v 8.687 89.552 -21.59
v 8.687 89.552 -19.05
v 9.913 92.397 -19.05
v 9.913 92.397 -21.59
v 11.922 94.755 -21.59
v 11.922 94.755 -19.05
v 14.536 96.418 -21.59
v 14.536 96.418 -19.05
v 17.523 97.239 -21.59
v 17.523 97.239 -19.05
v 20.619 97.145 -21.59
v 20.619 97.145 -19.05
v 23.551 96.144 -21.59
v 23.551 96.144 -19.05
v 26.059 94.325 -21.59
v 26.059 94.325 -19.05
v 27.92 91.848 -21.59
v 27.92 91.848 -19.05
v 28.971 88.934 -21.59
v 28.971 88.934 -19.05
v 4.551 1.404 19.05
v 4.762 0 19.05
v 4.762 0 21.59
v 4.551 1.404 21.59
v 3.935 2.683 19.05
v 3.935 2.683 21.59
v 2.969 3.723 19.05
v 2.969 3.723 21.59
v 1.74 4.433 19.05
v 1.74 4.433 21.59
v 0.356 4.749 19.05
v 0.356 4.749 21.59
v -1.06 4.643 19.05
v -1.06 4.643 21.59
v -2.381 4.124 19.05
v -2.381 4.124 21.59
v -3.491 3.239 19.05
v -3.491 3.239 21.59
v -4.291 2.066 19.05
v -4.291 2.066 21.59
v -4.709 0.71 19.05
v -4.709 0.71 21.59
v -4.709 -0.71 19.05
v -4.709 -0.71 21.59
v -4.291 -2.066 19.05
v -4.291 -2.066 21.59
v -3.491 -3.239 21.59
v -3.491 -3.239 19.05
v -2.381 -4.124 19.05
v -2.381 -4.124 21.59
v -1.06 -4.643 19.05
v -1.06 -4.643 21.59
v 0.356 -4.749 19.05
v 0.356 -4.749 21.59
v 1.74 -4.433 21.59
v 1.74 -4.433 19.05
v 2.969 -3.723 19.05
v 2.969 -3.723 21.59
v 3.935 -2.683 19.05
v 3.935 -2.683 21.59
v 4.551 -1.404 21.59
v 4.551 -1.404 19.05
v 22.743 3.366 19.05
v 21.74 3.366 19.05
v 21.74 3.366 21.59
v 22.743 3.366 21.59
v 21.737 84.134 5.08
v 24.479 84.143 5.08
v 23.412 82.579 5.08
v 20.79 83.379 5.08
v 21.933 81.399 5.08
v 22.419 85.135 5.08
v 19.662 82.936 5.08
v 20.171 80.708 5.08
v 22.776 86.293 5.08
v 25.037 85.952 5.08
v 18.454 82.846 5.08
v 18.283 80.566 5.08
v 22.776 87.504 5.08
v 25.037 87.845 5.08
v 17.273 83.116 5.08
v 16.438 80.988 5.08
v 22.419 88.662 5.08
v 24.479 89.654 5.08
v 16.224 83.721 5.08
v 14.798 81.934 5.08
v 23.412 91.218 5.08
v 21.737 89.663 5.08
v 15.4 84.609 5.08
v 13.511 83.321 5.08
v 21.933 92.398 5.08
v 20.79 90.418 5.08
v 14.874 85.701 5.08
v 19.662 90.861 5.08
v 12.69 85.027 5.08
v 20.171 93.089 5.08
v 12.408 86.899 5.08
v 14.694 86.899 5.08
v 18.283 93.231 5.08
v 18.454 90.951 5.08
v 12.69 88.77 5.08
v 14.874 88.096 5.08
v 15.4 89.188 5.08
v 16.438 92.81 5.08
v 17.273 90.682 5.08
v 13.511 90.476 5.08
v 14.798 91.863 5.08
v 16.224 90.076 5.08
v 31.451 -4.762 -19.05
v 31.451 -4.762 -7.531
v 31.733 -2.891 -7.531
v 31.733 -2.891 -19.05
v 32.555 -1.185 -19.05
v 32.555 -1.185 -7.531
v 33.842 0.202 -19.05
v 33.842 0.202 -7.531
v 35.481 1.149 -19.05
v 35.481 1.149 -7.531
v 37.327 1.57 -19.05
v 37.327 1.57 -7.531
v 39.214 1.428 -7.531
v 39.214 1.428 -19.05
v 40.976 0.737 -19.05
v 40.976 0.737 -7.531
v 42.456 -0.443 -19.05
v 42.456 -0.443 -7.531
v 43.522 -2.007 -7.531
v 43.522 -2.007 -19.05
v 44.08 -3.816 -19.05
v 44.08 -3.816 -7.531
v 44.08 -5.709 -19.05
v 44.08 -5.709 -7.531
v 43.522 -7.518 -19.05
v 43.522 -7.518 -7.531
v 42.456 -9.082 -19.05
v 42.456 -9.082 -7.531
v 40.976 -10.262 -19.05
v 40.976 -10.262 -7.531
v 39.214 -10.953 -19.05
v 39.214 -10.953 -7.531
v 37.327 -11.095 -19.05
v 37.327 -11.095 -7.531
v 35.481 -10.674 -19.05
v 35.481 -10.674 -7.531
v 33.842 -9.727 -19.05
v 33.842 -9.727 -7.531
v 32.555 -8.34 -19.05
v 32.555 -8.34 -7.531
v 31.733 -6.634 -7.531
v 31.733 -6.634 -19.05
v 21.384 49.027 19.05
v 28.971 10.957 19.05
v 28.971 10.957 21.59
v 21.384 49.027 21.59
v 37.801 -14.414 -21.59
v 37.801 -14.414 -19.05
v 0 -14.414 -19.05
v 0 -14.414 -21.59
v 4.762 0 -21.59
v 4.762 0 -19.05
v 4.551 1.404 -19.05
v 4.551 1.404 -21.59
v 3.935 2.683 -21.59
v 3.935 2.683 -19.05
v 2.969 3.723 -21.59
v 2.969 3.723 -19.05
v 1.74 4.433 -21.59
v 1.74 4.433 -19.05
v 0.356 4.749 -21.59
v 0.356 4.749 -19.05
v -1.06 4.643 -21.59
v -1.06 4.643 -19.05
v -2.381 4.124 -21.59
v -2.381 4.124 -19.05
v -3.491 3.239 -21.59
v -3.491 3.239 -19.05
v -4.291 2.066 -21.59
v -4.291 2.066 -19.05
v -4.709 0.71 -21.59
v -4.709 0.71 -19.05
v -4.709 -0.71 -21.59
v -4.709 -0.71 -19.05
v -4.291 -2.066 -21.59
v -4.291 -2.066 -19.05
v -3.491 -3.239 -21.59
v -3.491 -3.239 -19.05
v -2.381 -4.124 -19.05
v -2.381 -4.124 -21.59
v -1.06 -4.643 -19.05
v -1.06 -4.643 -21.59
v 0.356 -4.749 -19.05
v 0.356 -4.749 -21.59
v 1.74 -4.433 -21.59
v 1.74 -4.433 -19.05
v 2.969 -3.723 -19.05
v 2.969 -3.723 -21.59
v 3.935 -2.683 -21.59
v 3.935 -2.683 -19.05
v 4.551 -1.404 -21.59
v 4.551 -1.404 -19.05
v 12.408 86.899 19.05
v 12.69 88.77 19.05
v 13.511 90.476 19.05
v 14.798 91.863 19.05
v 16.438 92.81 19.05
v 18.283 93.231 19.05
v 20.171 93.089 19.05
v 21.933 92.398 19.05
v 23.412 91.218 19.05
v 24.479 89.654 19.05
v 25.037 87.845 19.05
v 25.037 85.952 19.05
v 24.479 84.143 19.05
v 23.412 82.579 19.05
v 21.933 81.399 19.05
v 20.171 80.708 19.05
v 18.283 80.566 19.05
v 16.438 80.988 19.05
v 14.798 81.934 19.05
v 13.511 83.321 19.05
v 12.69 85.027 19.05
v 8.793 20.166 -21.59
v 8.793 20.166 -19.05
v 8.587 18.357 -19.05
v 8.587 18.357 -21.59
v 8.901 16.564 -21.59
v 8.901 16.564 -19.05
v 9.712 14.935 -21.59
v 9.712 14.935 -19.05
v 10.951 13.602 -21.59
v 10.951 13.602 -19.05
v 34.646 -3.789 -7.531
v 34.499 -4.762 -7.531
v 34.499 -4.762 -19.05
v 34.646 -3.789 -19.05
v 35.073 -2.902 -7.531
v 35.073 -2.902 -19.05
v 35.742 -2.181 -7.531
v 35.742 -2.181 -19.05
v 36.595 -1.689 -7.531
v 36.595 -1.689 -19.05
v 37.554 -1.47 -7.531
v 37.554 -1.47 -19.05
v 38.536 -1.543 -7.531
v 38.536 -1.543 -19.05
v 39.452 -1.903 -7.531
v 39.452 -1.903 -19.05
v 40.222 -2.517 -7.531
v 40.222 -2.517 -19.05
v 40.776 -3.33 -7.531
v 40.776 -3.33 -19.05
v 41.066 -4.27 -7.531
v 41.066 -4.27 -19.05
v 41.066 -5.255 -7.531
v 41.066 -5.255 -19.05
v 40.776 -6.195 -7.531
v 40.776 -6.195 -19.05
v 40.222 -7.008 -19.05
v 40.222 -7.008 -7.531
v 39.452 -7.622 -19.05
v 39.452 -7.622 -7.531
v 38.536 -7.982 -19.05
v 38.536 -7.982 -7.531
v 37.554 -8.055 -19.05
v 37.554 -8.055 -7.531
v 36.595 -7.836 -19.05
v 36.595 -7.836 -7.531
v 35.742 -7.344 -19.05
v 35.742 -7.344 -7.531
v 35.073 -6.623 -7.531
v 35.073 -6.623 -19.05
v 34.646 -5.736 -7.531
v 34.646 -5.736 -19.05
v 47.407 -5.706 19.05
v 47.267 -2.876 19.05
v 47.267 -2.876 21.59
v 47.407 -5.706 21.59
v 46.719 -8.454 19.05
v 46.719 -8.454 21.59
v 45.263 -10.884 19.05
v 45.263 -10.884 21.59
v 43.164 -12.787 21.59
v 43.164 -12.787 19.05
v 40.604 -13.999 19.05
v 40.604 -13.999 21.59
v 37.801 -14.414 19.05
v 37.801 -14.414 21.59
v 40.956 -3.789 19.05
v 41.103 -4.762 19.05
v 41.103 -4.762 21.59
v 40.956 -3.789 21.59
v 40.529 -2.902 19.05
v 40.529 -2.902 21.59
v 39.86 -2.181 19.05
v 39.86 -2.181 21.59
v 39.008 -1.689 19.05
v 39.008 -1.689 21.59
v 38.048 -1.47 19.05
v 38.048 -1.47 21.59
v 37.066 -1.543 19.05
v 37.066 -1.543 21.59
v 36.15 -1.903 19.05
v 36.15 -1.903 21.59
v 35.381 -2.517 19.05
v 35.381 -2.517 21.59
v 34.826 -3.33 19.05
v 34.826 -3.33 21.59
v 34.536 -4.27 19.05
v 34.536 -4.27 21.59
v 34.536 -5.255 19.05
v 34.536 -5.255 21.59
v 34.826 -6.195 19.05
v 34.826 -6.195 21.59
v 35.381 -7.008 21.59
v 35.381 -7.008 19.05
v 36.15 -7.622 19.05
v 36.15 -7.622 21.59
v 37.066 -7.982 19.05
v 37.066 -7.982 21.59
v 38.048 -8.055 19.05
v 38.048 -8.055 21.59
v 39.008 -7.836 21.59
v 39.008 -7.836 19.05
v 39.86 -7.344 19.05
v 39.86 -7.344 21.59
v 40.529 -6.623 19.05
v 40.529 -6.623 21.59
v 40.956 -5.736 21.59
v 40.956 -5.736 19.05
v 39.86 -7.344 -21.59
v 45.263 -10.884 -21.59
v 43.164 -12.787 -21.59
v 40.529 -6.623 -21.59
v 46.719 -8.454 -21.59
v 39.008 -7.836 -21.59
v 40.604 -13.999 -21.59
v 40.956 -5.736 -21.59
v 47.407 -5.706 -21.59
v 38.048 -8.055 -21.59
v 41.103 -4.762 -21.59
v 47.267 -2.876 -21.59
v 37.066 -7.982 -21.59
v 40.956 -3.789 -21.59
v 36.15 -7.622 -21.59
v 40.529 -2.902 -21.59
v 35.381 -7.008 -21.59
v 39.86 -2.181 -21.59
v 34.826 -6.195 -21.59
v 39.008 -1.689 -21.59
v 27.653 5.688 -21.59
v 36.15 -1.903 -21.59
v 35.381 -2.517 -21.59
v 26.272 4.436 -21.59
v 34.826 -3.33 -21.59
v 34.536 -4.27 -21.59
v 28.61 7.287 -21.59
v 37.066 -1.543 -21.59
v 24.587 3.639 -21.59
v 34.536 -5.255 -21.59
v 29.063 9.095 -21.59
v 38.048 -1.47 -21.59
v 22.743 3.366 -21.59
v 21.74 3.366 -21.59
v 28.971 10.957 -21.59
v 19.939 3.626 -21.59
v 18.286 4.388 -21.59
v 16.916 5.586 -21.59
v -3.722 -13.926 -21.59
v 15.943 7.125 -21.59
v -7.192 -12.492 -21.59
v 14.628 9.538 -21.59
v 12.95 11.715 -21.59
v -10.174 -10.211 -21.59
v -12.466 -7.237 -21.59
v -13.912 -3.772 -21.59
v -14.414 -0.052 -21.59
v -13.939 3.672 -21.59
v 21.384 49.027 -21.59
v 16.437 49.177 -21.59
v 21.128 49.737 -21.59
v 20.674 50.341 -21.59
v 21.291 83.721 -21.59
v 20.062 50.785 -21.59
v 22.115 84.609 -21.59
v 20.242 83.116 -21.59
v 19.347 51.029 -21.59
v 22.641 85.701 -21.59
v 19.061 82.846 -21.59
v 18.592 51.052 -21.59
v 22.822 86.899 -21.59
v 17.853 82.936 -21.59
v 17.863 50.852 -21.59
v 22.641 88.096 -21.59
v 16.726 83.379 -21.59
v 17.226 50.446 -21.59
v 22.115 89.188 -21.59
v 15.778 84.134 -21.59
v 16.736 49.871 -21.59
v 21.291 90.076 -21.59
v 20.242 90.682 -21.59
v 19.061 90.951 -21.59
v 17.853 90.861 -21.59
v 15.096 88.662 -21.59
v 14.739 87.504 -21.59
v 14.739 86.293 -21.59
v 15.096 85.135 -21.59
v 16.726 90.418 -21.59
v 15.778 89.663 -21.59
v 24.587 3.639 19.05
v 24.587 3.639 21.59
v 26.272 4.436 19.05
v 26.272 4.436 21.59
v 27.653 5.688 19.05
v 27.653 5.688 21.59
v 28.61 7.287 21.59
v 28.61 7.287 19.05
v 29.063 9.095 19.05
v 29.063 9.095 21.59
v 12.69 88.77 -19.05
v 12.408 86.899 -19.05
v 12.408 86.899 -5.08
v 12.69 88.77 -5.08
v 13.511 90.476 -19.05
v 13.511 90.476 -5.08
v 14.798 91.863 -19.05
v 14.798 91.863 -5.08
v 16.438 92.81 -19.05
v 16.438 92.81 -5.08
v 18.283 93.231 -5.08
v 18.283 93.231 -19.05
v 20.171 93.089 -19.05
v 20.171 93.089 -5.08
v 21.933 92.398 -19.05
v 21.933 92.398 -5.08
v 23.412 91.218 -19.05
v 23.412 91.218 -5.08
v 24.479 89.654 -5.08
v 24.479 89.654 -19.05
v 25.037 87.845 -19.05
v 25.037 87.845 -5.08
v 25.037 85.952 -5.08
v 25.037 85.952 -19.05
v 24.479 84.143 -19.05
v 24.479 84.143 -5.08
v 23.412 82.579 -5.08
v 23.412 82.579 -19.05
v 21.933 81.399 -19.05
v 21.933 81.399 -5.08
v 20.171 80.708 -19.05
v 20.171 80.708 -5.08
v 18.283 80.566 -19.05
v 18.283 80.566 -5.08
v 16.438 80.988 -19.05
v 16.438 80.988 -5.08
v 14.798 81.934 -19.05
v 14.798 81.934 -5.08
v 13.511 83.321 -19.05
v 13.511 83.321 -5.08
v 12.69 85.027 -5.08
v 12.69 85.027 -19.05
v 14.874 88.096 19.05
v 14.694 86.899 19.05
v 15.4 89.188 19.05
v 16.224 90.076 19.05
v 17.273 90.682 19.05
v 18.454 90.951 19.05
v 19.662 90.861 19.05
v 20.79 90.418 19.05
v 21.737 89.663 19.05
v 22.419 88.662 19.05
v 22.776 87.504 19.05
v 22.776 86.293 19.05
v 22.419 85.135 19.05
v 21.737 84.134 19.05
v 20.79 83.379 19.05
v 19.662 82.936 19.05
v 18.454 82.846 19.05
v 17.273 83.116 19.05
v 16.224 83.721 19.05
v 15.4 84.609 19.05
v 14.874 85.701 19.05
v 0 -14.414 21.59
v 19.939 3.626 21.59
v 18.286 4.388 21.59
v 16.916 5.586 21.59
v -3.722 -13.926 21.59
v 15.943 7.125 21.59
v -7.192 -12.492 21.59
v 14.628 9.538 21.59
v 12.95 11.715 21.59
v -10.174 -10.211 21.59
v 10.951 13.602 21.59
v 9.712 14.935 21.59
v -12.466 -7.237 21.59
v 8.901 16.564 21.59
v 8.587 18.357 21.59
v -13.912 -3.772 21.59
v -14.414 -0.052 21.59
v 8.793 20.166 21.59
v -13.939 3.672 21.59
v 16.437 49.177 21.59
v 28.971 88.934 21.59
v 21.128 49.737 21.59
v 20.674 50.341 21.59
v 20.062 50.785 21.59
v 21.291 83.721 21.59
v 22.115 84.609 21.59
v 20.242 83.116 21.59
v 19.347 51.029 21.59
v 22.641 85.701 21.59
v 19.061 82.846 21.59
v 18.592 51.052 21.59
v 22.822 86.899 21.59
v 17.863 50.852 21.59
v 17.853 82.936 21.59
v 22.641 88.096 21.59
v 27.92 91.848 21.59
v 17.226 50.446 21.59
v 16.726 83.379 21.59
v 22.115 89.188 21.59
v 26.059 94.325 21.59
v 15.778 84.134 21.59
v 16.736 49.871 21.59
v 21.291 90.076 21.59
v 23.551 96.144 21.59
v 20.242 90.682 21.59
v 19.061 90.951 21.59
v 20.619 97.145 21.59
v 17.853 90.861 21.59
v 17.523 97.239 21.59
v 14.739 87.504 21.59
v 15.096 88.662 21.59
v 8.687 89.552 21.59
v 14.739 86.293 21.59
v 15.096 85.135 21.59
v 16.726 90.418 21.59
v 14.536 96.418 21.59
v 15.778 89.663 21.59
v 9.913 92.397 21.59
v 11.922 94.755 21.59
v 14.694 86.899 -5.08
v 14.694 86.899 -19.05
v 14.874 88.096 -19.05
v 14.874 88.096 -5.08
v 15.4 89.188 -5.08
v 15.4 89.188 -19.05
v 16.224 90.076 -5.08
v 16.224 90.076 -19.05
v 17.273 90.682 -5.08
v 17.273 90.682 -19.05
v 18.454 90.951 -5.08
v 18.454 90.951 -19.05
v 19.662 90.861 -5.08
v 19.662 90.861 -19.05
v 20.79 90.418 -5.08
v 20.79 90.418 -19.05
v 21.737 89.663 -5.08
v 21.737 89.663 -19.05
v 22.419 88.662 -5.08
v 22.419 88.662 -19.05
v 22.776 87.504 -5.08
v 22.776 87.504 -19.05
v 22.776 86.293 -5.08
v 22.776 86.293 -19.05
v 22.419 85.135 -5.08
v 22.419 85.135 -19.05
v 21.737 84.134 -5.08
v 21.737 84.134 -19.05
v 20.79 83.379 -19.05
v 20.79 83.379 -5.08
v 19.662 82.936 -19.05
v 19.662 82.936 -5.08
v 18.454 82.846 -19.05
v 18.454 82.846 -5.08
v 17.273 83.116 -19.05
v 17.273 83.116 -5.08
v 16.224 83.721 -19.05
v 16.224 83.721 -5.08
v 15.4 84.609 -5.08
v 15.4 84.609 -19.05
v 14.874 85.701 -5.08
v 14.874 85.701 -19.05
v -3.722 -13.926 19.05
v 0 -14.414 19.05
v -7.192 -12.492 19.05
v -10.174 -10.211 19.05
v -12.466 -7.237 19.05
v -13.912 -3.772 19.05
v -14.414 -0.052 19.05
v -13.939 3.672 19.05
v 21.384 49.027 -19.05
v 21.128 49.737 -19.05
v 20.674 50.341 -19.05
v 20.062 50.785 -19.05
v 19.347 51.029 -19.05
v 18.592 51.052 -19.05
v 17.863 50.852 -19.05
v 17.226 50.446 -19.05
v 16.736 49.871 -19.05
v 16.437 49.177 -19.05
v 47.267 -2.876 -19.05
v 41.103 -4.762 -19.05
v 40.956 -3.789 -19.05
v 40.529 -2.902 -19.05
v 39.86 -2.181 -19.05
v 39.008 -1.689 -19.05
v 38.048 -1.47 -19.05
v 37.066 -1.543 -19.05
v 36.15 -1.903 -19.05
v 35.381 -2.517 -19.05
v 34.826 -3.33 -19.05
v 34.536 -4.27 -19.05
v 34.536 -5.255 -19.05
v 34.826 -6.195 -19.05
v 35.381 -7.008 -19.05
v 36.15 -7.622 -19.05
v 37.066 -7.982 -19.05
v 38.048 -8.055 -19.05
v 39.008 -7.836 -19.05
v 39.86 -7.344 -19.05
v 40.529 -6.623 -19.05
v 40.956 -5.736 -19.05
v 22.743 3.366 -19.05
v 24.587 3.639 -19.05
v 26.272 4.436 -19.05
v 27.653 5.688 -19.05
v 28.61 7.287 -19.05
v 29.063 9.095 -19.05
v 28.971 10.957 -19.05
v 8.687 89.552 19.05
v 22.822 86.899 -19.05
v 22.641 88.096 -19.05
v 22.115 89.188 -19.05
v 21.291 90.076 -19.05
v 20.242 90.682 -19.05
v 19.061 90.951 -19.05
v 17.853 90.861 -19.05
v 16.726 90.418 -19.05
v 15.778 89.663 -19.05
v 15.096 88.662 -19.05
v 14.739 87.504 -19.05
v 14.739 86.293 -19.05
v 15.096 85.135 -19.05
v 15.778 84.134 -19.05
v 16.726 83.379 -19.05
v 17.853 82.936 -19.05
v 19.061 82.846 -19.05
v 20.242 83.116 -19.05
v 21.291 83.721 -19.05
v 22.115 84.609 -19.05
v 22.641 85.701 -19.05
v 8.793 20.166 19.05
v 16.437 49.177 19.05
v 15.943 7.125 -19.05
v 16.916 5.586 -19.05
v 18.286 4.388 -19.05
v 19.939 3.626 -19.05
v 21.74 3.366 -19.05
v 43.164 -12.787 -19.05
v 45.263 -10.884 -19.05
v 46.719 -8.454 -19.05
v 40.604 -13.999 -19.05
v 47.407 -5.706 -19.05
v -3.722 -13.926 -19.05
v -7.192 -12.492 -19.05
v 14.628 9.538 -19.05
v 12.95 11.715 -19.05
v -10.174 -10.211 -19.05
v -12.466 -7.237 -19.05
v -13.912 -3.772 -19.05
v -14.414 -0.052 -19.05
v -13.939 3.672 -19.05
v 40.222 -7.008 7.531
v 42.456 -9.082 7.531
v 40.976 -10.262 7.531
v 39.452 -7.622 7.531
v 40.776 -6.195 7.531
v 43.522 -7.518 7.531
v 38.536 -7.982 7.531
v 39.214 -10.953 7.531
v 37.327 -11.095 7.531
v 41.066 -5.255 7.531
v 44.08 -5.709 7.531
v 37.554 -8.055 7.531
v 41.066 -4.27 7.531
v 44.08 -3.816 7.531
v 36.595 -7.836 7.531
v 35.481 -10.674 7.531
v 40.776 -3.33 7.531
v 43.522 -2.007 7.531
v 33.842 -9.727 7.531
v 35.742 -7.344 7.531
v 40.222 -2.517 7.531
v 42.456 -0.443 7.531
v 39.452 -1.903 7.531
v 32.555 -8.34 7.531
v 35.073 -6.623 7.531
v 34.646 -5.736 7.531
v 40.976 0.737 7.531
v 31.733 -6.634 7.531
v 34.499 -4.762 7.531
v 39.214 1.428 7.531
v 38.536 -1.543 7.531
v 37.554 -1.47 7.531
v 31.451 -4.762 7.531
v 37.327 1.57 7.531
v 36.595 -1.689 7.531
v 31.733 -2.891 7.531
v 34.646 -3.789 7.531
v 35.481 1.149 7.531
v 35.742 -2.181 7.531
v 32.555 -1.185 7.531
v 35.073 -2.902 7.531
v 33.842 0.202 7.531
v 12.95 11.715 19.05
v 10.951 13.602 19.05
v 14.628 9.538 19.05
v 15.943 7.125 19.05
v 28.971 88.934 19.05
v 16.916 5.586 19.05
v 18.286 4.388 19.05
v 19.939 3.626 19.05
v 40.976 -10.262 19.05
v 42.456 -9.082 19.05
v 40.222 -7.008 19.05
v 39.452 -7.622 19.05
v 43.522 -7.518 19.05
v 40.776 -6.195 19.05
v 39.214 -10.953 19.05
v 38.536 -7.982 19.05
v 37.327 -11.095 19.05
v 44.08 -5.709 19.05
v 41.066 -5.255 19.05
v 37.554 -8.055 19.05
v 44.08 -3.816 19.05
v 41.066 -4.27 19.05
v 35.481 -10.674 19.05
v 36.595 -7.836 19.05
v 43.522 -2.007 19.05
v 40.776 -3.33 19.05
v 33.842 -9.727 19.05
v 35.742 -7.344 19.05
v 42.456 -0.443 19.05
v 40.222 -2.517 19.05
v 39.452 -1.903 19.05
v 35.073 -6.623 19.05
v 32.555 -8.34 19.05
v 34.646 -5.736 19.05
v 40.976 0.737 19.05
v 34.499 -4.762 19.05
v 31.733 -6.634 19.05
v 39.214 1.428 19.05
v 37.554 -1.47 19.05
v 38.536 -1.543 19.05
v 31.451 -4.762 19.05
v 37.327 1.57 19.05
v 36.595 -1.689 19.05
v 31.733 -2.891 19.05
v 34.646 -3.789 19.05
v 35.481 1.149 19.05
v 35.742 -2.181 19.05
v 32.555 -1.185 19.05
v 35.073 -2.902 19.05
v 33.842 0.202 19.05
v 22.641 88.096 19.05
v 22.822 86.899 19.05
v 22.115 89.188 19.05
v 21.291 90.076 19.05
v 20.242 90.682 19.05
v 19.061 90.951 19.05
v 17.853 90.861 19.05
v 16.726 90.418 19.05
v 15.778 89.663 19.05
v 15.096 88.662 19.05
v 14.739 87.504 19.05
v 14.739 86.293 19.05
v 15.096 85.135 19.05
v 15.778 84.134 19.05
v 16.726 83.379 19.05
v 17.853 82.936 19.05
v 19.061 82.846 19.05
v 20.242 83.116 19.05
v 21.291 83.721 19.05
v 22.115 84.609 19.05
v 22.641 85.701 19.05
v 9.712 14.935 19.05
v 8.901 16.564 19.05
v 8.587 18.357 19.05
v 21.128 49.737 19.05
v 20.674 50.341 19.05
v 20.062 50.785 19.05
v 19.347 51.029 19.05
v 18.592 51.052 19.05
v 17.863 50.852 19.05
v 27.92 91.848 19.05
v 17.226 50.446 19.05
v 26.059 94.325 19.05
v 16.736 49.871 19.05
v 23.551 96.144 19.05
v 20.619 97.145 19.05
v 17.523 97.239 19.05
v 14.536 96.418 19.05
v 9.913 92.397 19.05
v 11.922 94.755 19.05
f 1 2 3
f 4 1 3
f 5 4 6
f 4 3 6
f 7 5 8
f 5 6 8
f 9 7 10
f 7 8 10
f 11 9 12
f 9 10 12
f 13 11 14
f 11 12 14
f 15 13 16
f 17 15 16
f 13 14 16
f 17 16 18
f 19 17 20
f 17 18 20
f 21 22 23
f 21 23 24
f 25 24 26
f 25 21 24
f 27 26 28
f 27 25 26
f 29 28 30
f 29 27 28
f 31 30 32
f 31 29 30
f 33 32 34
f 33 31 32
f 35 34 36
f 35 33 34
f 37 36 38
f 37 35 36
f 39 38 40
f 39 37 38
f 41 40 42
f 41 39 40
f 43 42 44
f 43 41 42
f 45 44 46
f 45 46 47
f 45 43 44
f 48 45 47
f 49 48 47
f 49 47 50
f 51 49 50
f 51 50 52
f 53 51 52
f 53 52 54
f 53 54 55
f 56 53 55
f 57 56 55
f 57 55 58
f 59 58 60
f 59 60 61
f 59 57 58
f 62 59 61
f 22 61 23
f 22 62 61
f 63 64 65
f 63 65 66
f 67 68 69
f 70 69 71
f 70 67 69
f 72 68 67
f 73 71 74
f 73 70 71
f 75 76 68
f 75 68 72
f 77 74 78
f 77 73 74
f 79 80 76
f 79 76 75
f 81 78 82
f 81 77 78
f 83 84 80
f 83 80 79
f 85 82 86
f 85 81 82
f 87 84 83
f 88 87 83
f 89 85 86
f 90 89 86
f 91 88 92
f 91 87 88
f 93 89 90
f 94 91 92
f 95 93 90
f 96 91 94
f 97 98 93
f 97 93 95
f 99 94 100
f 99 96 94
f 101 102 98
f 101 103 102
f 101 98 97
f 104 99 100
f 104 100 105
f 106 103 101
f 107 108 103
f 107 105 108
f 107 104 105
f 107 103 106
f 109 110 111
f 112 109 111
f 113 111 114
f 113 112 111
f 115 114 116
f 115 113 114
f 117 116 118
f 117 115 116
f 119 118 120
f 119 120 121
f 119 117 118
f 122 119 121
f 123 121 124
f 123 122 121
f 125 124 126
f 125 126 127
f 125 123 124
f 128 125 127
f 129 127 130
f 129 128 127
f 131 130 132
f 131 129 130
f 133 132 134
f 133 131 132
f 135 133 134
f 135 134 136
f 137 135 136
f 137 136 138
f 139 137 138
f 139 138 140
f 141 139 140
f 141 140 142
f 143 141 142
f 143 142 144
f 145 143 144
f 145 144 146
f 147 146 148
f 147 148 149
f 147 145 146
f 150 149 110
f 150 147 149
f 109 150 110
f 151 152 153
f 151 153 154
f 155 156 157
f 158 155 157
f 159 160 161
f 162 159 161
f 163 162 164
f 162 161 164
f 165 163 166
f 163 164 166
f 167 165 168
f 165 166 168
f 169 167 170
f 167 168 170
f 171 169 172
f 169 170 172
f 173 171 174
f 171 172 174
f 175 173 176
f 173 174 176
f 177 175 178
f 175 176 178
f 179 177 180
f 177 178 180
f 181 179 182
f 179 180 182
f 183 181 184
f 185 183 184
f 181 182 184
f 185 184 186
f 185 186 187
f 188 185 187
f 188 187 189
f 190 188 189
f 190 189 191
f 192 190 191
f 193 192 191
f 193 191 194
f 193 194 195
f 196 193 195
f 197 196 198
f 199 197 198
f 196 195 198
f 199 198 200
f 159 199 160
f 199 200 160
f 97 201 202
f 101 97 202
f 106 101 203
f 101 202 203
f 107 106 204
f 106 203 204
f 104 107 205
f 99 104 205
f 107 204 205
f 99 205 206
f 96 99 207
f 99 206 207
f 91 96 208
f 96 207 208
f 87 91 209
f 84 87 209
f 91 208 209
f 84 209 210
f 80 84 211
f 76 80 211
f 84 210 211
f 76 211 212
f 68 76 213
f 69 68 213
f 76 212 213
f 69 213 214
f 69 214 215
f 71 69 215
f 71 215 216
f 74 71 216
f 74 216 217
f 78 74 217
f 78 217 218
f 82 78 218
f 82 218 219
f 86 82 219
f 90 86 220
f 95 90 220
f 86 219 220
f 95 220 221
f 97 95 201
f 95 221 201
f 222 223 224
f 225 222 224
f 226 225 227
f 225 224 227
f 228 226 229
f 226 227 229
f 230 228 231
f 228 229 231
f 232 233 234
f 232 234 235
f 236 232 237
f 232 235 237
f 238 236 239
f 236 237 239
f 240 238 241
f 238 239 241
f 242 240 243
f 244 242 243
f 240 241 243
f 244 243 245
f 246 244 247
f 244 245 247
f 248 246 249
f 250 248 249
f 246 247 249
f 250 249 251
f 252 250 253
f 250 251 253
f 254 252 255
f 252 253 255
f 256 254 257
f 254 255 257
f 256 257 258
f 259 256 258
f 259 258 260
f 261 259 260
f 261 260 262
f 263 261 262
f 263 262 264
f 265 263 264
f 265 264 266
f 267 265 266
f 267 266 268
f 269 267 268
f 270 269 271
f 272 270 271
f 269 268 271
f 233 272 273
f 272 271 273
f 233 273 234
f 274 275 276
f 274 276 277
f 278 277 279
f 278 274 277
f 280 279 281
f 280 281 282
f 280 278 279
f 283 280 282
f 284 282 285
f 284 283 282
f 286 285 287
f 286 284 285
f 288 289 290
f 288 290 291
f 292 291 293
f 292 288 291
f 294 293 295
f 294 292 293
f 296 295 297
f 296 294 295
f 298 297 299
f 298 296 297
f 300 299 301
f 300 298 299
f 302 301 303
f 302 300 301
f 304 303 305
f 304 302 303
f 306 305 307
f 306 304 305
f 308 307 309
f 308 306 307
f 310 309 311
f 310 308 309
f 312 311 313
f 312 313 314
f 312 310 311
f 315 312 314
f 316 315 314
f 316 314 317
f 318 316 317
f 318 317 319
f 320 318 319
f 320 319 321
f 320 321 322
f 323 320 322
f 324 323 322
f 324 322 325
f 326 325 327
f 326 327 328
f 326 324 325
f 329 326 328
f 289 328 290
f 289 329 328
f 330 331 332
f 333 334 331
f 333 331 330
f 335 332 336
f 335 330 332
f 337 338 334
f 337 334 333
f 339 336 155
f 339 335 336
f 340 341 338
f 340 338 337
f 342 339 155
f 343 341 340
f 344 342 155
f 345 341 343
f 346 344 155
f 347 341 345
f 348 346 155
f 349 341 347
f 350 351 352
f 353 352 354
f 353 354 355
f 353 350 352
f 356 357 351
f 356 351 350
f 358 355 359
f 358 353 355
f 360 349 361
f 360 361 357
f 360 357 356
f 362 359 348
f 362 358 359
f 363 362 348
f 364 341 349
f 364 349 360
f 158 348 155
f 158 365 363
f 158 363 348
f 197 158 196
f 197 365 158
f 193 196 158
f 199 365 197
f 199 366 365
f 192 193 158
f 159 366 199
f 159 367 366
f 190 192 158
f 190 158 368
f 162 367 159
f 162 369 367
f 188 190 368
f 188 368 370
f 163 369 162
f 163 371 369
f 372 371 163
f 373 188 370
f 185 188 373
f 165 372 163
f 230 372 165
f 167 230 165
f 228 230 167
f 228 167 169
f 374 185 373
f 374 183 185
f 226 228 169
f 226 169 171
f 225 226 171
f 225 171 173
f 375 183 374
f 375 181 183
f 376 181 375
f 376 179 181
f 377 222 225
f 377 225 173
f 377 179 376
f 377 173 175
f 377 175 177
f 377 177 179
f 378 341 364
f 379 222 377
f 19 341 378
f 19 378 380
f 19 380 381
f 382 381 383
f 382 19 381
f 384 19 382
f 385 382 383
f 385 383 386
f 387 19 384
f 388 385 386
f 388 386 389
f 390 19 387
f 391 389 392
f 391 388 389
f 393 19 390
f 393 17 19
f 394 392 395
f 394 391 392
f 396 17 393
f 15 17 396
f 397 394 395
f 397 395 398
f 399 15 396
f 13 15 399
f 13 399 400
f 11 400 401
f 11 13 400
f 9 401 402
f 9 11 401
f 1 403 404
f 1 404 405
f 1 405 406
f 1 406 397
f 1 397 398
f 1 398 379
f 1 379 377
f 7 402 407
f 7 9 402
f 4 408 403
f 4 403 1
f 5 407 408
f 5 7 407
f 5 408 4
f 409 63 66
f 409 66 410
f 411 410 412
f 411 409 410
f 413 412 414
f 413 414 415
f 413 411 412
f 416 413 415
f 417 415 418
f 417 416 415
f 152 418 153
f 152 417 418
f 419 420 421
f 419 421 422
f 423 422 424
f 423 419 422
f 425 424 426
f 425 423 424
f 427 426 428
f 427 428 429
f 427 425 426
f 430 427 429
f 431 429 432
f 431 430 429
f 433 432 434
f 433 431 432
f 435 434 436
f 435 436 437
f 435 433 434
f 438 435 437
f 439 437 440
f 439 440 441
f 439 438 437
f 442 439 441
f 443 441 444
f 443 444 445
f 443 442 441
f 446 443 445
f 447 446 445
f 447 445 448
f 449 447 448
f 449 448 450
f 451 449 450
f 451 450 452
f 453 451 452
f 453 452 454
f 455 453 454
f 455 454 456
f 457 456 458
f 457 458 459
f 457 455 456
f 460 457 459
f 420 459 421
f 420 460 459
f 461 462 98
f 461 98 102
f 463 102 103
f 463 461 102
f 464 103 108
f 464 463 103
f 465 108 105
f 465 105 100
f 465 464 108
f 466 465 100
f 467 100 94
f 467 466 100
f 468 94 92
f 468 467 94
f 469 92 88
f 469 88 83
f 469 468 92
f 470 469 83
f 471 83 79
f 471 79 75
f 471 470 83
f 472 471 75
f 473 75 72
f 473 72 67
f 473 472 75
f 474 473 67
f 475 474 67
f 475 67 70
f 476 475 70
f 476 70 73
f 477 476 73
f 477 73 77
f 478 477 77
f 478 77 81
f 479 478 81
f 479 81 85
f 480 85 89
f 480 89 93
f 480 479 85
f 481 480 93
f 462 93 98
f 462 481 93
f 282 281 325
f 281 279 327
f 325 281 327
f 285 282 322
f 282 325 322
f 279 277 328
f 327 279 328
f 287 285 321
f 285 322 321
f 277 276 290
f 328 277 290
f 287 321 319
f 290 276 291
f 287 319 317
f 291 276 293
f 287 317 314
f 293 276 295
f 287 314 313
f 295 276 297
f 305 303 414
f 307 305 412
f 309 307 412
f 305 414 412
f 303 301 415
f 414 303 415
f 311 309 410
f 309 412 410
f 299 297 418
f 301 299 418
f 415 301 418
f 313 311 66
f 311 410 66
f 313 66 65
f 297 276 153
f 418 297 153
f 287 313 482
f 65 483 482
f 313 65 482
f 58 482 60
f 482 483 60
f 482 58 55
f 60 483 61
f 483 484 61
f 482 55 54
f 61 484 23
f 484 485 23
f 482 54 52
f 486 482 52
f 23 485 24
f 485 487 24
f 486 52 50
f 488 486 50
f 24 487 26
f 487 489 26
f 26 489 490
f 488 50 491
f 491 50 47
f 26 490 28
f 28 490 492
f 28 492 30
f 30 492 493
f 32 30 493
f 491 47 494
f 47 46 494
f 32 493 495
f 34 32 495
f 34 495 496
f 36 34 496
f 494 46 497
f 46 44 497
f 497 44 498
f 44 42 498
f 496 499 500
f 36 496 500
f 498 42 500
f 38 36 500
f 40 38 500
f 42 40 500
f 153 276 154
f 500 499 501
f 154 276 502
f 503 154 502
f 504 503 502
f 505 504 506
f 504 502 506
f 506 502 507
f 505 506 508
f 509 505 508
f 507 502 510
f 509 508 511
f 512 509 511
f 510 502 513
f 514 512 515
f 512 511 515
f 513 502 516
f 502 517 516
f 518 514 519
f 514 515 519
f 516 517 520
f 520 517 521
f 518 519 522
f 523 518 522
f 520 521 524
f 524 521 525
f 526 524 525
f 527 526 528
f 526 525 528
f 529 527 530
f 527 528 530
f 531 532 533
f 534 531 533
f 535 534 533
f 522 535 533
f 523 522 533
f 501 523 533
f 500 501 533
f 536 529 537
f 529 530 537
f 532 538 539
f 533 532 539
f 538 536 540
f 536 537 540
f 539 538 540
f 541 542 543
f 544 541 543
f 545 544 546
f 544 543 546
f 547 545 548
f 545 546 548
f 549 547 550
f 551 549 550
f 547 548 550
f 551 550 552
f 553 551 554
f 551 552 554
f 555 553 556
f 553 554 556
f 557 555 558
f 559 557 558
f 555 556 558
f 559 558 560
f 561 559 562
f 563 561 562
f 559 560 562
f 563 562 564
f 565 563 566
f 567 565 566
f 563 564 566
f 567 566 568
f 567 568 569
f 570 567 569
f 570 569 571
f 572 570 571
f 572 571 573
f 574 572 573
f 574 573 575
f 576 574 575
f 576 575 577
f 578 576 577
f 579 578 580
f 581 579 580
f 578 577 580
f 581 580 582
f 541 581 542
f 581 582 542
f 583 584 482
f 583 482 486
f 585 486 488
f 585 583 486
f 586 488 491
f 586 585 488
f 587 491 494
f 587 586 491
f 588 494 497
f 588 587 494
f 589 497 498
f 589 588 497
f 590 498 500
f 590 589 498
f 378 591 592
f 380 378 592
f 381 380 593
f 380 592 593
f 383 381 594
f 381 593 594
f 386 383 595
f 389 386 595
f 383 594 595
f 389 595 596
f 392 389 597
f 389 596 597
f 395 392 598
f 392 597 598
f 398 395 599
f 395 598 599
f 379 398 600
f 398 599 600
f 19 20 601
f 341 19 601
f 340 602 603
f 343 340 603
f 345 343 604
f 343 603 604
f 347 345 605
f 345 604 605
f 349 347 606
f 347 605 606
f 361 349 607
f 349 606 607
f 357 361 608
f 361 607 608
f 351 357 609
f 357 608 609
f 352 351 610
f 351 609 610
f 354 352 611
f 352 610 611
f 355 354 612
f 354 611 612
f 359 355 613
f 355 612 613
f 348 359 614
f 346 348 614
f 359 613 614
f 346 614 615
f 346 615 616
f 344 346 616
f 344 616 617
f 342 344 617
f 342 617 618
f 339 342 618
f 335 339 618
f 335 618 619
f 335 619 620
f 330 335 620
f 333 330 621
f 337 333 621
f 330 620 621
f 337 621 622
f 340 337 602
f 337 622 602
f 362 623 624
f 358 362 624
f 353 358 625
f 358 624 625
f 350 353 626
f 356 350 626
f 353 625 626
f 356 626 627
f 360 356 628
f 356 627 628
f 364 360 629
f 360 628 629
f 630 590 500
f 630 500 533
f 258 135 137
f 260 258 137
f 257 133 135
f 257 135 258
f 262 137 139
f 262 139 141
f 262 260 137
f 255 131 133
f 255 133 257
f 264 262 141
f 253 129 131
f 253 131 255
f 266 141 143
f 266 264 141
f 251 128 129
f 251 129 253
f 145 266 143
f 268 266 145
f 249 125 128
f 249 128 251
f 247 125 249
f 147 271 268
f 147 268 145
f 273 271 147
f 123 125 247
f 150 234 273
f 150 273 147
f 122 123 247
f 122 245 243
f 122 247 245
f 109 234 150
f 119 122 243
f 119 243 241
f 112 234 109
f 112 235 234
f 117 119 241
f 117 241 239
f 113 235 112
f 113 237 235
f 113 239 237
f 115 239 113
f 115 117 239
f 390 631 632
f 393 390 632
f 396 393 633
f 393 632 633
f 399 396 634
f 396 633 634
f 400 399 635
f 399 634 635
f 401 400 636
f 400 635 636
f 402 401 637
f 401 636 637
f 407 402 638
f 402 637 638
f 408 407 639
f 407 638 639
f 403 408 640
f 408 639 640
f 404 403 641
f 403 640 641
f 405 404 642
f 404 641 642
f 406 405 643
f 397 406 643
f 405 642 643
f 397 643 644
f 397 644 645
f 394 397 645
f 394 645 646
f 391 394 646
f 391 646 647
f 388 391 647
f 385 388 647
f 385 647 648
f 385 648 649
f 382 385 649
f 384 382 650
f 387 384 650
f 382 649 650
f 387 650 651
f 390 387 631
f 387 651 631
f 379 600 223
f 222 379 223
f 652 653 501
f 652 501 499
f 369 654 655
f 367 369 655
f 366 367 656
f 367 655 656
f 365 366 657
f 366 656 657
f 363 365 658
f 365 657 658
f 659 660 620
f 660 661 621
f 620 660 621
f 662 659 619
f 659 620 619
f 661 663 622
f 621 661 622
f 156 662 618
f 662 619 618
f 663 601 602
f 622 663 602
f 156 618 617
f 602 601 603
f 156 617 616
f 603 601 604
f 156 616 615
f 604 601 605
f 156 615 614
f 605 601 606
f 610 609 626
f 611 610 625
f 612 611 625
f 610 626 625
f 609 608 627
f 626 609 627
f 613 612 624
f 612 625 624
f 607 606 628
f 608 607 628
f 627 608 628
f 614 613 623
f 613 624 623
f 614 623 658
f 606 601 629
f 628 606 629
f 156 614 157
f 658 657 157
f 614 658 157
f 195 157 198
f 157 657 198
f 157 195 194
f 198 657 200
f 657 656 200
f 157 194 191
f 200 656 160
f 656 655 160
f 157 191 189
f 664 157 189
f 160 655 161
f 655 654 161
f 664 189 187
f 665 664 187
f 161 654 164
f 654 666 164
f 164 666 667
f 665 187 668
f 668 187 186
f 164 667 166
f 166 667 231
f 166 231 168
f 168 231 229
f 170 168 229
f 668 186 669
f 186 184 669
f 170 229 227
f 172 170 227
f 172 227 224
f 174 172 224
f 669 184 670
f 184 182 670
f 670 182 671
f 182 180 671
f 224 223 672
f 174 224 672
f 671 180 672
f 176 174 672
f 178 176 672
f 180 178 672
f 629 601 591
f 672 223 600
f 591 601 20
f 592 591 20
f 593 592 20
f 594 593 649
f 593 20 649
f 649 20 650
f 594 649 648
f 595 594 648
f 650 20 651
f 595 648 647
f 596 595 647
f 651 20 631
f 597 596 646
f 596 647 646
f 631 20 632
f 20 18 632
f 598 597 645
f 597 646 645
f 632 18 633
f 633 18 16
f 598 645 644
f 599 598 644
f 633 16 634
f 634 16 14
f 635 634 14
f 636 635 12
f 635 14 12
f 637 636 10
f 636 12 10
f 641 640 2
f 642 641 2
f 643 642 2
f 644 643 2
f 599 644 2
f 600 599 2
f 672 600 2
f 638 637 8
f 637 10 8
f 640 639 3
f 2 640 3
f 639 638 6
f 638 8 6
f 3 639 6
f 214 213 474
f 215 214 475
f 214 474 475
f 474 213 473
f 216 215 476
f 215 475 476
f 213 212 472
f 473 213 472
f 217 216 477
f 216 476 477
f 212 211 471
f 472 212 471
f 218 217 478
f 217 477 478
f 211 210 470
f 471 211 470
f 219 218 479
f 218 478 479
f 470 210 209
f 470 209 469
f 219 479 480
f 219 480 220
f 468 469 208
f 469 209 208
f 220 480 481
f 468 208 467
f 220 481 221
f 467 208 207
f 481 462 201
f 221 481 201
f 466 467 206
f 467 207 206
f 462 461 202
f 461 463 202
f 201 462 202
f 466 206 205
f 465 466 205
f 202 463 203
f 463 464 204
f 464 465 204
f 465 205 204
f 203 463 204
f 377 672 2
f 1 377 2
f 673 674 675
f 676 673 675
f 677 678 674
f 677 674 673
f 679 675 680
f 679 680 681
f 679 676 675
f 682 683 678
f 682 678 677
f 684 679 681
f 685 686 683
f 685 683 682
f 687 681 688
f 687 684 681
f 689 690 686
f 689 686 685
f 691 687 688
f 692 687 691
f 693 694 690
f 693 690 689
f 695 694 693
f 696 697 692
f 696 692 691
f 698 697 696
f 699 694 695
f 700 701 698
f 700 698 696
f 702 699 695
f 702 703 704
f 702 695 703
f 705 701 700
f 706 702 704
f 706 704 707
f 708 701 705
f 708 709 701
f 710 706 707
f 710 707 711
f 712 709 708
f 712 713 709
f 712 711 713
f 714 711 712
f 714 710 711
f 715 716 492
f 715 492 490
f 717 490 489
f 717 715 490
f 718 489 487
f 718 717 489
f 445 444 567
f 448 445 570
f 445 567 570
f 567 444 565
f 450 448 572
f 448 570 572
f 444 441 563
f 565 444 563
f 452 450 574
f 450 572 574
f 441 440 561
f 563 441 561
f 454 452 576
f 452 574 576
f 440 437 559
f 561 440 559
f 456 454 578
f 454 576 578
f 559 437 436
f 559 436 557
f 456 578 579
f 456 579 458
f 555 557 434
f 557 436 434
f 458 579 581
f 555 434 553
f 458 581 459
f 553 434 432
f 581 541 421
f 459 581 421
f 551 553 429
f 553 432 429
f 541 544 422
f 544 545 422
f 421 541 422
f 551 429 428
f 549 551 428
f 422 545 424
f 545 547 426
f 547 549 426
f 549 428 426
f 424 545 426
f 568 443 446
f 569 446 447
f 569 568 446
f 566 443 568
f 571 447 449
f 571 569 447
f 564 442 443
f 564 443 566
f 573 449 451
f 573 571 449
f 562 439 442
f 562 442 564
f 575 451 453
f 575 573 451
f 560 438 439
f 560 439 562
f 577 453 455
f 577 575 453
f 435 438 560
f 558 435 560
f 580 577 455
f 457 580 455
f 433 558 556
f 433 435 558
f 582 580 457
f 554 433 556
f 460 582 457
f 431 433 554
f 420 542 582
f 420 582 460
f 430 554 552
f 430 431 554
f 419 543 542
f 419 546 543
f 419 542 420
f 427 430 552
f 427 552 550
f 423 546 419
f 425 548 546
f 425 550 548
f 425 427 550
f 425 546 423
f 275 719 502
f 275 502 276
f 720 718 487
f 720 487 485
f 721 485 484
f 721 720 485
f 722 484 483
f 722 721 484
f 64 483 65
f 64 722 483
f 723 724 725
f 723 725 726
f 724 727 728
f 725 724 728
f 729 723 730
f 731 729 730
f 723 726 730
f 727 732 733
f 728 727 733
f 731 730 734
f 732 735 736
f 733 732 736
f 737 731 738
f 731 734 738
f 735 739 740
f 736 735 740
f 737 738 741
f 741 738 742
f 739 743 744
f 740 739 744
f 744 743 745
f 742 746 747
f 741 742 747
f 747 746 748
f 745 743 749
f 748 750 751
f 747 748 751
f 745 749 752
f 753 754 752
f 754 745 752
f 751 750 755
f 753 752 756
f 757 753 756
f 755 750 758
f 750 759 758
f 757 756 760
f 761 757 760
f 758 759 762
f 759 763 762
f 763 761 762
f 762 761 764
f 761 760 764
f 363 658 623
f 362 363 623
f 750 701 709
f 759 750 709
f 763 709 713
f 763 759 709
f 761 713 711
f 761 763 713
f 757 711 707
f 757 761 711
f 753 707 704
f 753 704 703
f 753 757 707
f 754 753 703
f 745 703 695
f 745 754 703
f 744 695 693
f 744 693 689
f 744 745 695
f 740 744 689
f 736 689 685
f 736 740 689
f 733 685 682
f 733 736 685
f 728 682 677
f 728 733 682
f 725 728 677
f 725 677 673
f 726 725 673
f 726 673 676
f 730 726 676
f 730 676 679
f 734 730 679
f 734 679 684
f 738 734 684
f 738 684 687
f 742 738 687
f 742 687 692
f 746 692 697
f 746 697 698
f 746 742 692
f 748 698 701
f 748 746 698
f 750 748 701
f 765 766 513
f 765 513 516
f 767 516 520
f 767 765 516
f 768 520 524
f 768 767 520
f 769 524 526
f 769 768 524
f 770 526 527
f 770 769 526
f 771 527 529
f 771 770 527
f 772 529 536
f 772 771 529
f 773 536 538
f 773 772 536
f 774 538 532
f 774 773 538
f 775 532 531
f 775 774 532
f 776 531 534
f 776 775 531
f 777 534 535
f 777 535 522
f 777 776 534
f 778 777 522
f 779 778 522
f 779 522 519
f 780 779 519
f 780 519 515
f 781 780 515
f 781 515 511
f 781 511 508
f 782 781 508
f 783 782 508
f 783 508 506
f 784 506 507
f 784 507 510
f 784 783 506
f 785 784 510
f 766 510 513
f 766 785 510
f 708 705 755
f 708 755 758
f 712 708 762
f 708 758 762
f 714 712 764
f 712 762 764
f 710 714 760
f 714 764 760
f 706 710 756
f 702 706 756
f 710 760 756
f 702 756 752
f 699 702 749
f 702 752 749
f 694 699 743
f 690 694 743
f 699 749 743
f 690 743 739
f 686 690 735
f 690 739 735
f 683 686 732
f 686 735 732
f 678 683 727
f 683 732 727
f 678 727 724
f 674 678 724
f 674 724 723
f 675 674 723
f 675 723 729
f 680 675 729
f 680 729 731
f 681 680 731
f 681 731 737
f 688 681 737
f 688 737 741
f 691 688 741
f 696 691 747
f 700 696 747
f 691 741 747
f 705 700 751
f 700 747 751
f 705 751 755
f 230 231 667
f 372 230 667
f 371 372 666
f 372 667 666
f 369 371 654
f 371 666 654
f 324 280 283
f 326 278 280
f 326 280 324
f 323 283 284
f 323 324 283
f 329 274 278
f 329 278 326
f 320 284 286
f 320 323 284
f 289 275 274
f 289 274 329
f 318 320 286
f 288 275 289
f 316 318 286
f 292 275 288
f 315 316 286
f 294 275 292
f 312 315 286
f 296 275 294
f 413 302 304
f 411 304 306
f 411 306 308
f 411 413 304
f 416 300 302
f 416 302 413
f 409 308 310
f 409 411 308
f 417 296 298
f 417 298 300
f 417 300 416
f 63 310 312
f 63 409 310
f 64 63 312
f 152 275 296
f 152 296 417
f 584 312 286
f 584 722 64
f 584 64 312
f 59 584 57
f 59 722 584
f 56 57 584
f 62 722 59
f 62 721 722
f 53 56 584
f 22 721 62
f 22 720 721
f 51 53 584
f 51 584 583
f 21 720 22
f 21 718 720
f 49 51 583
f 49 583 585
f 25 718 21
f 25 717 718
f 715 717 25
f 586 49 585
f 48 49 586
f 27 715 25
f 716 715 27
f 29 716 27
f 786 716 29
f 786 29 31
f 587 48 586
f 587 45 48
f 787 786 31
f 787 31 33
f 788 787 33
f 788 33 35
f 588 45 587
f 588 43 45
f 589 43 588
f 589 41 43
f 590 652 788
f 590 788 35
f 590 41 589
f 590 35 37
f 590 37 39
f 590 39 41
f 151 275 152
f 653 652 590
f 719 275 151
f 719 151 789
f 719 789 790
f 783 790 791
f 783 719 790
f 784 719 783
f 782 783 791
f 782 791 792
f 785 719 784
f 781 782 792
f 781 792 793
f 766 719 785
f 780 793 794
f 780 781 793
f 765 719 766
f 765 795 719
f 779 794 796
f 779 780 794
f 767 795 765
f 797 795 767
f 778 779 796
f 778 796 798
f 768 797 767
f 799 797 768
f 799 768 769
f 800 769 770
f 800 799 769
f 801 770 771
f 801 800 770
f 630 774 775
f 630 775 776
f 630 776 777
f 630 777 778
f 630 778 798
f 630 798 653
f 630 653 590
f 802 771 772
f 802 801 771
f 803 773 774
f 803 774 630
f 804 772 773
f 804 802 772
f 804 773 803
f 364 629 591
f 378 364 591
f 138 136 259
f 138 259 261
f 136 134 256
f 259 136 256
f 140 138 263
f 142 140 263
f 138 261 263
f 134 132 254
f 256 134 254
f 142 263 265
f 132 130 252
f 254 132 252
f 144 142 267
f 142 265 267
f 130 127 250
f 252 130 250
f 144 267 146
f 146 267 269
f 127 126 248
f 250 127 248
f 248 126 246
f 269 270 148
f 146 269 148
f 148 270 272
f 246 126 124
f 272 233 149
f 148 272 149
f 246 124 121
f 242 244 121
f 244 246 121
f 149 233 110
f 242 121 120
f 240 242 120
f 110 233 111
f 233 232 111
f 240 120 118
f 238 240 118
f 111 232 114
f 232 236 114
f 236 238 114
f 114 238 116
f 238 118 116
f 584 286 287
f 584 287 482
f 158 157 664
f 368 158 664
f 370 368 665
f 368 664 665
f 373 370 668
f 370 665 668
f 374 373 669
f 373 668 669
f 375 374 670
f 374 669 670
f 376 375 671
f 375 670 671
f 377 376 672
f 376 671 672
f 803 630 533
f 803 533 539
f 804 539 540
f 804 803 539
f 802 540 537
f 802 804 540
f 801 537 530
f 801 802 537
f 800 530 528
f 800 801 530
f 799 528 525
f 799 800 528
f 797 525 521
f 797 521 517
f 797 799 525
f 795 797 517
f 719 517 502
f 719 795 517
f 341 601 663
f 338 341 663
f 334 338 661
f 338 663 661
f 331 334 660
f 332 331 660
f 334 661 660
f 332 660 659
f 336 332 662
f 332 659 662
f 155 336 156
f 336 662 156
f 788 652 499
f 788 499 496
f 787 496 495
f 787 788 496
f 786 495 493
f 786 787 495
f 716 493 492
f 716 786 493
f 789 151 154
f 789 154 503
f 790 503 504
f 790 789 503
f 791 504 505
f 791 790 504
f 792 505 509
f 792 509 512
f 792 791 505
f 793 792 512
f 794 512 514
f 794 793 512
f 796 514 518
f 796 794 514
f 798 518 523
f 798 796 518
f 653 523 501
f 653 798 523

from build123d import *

# Parameters (mm, degrees)
BELLCRANK_START       = 19.05
SKETCH4_R             = 4.064
SKETCH4_R_2           = 3.302
SKETCH4_R_3           = 4.7625
BELLCRANK_PLATE_DEPTH = 2.54
SKETCH5_R             = 6.35
SKETCH5_R_2           = 3.302
PULL_ROD_WASHER_DEPTH = 11.5189
SKETCH6_R             = 6.35
SKETCH6_R_2           = 4.064
DAMPER_WASHER_DEPTH   = 13.97


with BuildPart() as part:
    # Sketch4 → Bellcrank Plate (new body)
    with BuildSketch(Plane.XY.offset(BELLCRANK_START)):
        with BuildLine():
            Line((-13.938846994, 3.672377258), (8.687231987, 89.551749343))
            ThreePointArc((8.687231987, 89.551749343), (19.074657941, 97.307750165), (28.970759131, 88.933901114))
            Line((28.970759131, 88.933901114), (47.267037407, -2.876103068))
            ThreePointArc((47.267037407, -2.876103068), (45.263363465, -10.884329825), (37.801171857, -14.4145))
            Line((37.801171857, -14.4145), (0, -14.4145))
            ThreePointArc((0, -14.4145), (-11.417383506, -8.798929715), (-13.938846994, 3.672377258))
        make_face()
        with Locations((18.757588406, 86.898578108)):
            Circle(SKETCH4_R, mode=Mode.SUBTRACT)
        with Locations((37.801171857, -4.7625)):
            Circle(SKETCH4_R_2, mode=Mode.SUBTRACT)
        Circle(SKETCH4_R_3, mode=Mode.SUBTRACT)
        with BuildLine():
            Line((16.436771041, 49.177310547), (8.793234212, 20.1655607))
            ThreePointArc((8.793234212, 20.1655607), (8.901387915, 16.564401008), (10.951376658, 13.601700465))
            ThreePointArc((10.951376658, 13.601700465), (13.831632, 10.659496351), (15.94294691, 7.1247))
            ThreePointArc((15.94294691, 7.1247), (18.28560864, 4.387551051), (21.740382149, 3.3655))
            Line((21.740382149, 3.3655), (22.743190098, 3.3655))
            ThreePointArc((22.743190098, 3.3655), (27.652526682, 5.687980378), (28.970733223, 10.956550613))
            Line((28.970733223, 10.956550613), (21.383972784, 49.026615857))
            ThreePointArc((21.383972784, 49.026615857), (18.970289567, 51.069018064), (16.436771041, 49.177310547))
        make_face(mode=Mode.SUBTRACT)
    extrude(amount=BELLCRANK_PLATE_DEPTH)


with BuildPart() as body_2:
    # Sketch5 → Pull Rod Washer (new body)
    with BuildSketch(Plane(origin=(0, 0, 19.05), x_dir=(-1, 0, 0), z_dir=(0, 0, -1))):
        with Locations((-37.801171857, -4.7625)):
            Circle(SKETCH5_R)
        with Locations((-37.801171857, -4.7625)):
            Circle(SKETCH5_R_2, mode=Mode.SUBTRACT)
    extrude(amount=PULL_ROD_WASHER_DEPTH)


with BuildPart() as body_3:
    # Sketch6 → Damper Washer (new body)
    with BuildSketch(Plane(origin=(0, 0, 19.05), x_dir=(-1, 0, 0), z_dir=(0, 0, -1))):
        with Locations((-18.757588406, 86.898578108)):
            Circle(SKETCH6_R)
        with Locations((-18.757588406, 86.898578108)):
            Circle(SKETCH6_R_2, mode=Mode.SUBTRACT)
    extrude(amount=DAMPER_WASHER_DEPTH)


with BuildPart() as body_4:
    # Bellcrank Mirror: mirrored copy
    add(part.part.mirror(Plane.XY))


with BuildPart() as body_5:
    # Bellcrank Mirror 2: mirrored copy
    add(body_2.part.mirror(Plane.XY))


with BuildPart() as body_6:
    # Bellcrank Mirror 3: mirrored copy
    add(body_3.part.mirror(Plane.XY))


solid = Compound([part.part, body_2.part, body_3.part, body_4.part, body_5.part, body_6.part])
